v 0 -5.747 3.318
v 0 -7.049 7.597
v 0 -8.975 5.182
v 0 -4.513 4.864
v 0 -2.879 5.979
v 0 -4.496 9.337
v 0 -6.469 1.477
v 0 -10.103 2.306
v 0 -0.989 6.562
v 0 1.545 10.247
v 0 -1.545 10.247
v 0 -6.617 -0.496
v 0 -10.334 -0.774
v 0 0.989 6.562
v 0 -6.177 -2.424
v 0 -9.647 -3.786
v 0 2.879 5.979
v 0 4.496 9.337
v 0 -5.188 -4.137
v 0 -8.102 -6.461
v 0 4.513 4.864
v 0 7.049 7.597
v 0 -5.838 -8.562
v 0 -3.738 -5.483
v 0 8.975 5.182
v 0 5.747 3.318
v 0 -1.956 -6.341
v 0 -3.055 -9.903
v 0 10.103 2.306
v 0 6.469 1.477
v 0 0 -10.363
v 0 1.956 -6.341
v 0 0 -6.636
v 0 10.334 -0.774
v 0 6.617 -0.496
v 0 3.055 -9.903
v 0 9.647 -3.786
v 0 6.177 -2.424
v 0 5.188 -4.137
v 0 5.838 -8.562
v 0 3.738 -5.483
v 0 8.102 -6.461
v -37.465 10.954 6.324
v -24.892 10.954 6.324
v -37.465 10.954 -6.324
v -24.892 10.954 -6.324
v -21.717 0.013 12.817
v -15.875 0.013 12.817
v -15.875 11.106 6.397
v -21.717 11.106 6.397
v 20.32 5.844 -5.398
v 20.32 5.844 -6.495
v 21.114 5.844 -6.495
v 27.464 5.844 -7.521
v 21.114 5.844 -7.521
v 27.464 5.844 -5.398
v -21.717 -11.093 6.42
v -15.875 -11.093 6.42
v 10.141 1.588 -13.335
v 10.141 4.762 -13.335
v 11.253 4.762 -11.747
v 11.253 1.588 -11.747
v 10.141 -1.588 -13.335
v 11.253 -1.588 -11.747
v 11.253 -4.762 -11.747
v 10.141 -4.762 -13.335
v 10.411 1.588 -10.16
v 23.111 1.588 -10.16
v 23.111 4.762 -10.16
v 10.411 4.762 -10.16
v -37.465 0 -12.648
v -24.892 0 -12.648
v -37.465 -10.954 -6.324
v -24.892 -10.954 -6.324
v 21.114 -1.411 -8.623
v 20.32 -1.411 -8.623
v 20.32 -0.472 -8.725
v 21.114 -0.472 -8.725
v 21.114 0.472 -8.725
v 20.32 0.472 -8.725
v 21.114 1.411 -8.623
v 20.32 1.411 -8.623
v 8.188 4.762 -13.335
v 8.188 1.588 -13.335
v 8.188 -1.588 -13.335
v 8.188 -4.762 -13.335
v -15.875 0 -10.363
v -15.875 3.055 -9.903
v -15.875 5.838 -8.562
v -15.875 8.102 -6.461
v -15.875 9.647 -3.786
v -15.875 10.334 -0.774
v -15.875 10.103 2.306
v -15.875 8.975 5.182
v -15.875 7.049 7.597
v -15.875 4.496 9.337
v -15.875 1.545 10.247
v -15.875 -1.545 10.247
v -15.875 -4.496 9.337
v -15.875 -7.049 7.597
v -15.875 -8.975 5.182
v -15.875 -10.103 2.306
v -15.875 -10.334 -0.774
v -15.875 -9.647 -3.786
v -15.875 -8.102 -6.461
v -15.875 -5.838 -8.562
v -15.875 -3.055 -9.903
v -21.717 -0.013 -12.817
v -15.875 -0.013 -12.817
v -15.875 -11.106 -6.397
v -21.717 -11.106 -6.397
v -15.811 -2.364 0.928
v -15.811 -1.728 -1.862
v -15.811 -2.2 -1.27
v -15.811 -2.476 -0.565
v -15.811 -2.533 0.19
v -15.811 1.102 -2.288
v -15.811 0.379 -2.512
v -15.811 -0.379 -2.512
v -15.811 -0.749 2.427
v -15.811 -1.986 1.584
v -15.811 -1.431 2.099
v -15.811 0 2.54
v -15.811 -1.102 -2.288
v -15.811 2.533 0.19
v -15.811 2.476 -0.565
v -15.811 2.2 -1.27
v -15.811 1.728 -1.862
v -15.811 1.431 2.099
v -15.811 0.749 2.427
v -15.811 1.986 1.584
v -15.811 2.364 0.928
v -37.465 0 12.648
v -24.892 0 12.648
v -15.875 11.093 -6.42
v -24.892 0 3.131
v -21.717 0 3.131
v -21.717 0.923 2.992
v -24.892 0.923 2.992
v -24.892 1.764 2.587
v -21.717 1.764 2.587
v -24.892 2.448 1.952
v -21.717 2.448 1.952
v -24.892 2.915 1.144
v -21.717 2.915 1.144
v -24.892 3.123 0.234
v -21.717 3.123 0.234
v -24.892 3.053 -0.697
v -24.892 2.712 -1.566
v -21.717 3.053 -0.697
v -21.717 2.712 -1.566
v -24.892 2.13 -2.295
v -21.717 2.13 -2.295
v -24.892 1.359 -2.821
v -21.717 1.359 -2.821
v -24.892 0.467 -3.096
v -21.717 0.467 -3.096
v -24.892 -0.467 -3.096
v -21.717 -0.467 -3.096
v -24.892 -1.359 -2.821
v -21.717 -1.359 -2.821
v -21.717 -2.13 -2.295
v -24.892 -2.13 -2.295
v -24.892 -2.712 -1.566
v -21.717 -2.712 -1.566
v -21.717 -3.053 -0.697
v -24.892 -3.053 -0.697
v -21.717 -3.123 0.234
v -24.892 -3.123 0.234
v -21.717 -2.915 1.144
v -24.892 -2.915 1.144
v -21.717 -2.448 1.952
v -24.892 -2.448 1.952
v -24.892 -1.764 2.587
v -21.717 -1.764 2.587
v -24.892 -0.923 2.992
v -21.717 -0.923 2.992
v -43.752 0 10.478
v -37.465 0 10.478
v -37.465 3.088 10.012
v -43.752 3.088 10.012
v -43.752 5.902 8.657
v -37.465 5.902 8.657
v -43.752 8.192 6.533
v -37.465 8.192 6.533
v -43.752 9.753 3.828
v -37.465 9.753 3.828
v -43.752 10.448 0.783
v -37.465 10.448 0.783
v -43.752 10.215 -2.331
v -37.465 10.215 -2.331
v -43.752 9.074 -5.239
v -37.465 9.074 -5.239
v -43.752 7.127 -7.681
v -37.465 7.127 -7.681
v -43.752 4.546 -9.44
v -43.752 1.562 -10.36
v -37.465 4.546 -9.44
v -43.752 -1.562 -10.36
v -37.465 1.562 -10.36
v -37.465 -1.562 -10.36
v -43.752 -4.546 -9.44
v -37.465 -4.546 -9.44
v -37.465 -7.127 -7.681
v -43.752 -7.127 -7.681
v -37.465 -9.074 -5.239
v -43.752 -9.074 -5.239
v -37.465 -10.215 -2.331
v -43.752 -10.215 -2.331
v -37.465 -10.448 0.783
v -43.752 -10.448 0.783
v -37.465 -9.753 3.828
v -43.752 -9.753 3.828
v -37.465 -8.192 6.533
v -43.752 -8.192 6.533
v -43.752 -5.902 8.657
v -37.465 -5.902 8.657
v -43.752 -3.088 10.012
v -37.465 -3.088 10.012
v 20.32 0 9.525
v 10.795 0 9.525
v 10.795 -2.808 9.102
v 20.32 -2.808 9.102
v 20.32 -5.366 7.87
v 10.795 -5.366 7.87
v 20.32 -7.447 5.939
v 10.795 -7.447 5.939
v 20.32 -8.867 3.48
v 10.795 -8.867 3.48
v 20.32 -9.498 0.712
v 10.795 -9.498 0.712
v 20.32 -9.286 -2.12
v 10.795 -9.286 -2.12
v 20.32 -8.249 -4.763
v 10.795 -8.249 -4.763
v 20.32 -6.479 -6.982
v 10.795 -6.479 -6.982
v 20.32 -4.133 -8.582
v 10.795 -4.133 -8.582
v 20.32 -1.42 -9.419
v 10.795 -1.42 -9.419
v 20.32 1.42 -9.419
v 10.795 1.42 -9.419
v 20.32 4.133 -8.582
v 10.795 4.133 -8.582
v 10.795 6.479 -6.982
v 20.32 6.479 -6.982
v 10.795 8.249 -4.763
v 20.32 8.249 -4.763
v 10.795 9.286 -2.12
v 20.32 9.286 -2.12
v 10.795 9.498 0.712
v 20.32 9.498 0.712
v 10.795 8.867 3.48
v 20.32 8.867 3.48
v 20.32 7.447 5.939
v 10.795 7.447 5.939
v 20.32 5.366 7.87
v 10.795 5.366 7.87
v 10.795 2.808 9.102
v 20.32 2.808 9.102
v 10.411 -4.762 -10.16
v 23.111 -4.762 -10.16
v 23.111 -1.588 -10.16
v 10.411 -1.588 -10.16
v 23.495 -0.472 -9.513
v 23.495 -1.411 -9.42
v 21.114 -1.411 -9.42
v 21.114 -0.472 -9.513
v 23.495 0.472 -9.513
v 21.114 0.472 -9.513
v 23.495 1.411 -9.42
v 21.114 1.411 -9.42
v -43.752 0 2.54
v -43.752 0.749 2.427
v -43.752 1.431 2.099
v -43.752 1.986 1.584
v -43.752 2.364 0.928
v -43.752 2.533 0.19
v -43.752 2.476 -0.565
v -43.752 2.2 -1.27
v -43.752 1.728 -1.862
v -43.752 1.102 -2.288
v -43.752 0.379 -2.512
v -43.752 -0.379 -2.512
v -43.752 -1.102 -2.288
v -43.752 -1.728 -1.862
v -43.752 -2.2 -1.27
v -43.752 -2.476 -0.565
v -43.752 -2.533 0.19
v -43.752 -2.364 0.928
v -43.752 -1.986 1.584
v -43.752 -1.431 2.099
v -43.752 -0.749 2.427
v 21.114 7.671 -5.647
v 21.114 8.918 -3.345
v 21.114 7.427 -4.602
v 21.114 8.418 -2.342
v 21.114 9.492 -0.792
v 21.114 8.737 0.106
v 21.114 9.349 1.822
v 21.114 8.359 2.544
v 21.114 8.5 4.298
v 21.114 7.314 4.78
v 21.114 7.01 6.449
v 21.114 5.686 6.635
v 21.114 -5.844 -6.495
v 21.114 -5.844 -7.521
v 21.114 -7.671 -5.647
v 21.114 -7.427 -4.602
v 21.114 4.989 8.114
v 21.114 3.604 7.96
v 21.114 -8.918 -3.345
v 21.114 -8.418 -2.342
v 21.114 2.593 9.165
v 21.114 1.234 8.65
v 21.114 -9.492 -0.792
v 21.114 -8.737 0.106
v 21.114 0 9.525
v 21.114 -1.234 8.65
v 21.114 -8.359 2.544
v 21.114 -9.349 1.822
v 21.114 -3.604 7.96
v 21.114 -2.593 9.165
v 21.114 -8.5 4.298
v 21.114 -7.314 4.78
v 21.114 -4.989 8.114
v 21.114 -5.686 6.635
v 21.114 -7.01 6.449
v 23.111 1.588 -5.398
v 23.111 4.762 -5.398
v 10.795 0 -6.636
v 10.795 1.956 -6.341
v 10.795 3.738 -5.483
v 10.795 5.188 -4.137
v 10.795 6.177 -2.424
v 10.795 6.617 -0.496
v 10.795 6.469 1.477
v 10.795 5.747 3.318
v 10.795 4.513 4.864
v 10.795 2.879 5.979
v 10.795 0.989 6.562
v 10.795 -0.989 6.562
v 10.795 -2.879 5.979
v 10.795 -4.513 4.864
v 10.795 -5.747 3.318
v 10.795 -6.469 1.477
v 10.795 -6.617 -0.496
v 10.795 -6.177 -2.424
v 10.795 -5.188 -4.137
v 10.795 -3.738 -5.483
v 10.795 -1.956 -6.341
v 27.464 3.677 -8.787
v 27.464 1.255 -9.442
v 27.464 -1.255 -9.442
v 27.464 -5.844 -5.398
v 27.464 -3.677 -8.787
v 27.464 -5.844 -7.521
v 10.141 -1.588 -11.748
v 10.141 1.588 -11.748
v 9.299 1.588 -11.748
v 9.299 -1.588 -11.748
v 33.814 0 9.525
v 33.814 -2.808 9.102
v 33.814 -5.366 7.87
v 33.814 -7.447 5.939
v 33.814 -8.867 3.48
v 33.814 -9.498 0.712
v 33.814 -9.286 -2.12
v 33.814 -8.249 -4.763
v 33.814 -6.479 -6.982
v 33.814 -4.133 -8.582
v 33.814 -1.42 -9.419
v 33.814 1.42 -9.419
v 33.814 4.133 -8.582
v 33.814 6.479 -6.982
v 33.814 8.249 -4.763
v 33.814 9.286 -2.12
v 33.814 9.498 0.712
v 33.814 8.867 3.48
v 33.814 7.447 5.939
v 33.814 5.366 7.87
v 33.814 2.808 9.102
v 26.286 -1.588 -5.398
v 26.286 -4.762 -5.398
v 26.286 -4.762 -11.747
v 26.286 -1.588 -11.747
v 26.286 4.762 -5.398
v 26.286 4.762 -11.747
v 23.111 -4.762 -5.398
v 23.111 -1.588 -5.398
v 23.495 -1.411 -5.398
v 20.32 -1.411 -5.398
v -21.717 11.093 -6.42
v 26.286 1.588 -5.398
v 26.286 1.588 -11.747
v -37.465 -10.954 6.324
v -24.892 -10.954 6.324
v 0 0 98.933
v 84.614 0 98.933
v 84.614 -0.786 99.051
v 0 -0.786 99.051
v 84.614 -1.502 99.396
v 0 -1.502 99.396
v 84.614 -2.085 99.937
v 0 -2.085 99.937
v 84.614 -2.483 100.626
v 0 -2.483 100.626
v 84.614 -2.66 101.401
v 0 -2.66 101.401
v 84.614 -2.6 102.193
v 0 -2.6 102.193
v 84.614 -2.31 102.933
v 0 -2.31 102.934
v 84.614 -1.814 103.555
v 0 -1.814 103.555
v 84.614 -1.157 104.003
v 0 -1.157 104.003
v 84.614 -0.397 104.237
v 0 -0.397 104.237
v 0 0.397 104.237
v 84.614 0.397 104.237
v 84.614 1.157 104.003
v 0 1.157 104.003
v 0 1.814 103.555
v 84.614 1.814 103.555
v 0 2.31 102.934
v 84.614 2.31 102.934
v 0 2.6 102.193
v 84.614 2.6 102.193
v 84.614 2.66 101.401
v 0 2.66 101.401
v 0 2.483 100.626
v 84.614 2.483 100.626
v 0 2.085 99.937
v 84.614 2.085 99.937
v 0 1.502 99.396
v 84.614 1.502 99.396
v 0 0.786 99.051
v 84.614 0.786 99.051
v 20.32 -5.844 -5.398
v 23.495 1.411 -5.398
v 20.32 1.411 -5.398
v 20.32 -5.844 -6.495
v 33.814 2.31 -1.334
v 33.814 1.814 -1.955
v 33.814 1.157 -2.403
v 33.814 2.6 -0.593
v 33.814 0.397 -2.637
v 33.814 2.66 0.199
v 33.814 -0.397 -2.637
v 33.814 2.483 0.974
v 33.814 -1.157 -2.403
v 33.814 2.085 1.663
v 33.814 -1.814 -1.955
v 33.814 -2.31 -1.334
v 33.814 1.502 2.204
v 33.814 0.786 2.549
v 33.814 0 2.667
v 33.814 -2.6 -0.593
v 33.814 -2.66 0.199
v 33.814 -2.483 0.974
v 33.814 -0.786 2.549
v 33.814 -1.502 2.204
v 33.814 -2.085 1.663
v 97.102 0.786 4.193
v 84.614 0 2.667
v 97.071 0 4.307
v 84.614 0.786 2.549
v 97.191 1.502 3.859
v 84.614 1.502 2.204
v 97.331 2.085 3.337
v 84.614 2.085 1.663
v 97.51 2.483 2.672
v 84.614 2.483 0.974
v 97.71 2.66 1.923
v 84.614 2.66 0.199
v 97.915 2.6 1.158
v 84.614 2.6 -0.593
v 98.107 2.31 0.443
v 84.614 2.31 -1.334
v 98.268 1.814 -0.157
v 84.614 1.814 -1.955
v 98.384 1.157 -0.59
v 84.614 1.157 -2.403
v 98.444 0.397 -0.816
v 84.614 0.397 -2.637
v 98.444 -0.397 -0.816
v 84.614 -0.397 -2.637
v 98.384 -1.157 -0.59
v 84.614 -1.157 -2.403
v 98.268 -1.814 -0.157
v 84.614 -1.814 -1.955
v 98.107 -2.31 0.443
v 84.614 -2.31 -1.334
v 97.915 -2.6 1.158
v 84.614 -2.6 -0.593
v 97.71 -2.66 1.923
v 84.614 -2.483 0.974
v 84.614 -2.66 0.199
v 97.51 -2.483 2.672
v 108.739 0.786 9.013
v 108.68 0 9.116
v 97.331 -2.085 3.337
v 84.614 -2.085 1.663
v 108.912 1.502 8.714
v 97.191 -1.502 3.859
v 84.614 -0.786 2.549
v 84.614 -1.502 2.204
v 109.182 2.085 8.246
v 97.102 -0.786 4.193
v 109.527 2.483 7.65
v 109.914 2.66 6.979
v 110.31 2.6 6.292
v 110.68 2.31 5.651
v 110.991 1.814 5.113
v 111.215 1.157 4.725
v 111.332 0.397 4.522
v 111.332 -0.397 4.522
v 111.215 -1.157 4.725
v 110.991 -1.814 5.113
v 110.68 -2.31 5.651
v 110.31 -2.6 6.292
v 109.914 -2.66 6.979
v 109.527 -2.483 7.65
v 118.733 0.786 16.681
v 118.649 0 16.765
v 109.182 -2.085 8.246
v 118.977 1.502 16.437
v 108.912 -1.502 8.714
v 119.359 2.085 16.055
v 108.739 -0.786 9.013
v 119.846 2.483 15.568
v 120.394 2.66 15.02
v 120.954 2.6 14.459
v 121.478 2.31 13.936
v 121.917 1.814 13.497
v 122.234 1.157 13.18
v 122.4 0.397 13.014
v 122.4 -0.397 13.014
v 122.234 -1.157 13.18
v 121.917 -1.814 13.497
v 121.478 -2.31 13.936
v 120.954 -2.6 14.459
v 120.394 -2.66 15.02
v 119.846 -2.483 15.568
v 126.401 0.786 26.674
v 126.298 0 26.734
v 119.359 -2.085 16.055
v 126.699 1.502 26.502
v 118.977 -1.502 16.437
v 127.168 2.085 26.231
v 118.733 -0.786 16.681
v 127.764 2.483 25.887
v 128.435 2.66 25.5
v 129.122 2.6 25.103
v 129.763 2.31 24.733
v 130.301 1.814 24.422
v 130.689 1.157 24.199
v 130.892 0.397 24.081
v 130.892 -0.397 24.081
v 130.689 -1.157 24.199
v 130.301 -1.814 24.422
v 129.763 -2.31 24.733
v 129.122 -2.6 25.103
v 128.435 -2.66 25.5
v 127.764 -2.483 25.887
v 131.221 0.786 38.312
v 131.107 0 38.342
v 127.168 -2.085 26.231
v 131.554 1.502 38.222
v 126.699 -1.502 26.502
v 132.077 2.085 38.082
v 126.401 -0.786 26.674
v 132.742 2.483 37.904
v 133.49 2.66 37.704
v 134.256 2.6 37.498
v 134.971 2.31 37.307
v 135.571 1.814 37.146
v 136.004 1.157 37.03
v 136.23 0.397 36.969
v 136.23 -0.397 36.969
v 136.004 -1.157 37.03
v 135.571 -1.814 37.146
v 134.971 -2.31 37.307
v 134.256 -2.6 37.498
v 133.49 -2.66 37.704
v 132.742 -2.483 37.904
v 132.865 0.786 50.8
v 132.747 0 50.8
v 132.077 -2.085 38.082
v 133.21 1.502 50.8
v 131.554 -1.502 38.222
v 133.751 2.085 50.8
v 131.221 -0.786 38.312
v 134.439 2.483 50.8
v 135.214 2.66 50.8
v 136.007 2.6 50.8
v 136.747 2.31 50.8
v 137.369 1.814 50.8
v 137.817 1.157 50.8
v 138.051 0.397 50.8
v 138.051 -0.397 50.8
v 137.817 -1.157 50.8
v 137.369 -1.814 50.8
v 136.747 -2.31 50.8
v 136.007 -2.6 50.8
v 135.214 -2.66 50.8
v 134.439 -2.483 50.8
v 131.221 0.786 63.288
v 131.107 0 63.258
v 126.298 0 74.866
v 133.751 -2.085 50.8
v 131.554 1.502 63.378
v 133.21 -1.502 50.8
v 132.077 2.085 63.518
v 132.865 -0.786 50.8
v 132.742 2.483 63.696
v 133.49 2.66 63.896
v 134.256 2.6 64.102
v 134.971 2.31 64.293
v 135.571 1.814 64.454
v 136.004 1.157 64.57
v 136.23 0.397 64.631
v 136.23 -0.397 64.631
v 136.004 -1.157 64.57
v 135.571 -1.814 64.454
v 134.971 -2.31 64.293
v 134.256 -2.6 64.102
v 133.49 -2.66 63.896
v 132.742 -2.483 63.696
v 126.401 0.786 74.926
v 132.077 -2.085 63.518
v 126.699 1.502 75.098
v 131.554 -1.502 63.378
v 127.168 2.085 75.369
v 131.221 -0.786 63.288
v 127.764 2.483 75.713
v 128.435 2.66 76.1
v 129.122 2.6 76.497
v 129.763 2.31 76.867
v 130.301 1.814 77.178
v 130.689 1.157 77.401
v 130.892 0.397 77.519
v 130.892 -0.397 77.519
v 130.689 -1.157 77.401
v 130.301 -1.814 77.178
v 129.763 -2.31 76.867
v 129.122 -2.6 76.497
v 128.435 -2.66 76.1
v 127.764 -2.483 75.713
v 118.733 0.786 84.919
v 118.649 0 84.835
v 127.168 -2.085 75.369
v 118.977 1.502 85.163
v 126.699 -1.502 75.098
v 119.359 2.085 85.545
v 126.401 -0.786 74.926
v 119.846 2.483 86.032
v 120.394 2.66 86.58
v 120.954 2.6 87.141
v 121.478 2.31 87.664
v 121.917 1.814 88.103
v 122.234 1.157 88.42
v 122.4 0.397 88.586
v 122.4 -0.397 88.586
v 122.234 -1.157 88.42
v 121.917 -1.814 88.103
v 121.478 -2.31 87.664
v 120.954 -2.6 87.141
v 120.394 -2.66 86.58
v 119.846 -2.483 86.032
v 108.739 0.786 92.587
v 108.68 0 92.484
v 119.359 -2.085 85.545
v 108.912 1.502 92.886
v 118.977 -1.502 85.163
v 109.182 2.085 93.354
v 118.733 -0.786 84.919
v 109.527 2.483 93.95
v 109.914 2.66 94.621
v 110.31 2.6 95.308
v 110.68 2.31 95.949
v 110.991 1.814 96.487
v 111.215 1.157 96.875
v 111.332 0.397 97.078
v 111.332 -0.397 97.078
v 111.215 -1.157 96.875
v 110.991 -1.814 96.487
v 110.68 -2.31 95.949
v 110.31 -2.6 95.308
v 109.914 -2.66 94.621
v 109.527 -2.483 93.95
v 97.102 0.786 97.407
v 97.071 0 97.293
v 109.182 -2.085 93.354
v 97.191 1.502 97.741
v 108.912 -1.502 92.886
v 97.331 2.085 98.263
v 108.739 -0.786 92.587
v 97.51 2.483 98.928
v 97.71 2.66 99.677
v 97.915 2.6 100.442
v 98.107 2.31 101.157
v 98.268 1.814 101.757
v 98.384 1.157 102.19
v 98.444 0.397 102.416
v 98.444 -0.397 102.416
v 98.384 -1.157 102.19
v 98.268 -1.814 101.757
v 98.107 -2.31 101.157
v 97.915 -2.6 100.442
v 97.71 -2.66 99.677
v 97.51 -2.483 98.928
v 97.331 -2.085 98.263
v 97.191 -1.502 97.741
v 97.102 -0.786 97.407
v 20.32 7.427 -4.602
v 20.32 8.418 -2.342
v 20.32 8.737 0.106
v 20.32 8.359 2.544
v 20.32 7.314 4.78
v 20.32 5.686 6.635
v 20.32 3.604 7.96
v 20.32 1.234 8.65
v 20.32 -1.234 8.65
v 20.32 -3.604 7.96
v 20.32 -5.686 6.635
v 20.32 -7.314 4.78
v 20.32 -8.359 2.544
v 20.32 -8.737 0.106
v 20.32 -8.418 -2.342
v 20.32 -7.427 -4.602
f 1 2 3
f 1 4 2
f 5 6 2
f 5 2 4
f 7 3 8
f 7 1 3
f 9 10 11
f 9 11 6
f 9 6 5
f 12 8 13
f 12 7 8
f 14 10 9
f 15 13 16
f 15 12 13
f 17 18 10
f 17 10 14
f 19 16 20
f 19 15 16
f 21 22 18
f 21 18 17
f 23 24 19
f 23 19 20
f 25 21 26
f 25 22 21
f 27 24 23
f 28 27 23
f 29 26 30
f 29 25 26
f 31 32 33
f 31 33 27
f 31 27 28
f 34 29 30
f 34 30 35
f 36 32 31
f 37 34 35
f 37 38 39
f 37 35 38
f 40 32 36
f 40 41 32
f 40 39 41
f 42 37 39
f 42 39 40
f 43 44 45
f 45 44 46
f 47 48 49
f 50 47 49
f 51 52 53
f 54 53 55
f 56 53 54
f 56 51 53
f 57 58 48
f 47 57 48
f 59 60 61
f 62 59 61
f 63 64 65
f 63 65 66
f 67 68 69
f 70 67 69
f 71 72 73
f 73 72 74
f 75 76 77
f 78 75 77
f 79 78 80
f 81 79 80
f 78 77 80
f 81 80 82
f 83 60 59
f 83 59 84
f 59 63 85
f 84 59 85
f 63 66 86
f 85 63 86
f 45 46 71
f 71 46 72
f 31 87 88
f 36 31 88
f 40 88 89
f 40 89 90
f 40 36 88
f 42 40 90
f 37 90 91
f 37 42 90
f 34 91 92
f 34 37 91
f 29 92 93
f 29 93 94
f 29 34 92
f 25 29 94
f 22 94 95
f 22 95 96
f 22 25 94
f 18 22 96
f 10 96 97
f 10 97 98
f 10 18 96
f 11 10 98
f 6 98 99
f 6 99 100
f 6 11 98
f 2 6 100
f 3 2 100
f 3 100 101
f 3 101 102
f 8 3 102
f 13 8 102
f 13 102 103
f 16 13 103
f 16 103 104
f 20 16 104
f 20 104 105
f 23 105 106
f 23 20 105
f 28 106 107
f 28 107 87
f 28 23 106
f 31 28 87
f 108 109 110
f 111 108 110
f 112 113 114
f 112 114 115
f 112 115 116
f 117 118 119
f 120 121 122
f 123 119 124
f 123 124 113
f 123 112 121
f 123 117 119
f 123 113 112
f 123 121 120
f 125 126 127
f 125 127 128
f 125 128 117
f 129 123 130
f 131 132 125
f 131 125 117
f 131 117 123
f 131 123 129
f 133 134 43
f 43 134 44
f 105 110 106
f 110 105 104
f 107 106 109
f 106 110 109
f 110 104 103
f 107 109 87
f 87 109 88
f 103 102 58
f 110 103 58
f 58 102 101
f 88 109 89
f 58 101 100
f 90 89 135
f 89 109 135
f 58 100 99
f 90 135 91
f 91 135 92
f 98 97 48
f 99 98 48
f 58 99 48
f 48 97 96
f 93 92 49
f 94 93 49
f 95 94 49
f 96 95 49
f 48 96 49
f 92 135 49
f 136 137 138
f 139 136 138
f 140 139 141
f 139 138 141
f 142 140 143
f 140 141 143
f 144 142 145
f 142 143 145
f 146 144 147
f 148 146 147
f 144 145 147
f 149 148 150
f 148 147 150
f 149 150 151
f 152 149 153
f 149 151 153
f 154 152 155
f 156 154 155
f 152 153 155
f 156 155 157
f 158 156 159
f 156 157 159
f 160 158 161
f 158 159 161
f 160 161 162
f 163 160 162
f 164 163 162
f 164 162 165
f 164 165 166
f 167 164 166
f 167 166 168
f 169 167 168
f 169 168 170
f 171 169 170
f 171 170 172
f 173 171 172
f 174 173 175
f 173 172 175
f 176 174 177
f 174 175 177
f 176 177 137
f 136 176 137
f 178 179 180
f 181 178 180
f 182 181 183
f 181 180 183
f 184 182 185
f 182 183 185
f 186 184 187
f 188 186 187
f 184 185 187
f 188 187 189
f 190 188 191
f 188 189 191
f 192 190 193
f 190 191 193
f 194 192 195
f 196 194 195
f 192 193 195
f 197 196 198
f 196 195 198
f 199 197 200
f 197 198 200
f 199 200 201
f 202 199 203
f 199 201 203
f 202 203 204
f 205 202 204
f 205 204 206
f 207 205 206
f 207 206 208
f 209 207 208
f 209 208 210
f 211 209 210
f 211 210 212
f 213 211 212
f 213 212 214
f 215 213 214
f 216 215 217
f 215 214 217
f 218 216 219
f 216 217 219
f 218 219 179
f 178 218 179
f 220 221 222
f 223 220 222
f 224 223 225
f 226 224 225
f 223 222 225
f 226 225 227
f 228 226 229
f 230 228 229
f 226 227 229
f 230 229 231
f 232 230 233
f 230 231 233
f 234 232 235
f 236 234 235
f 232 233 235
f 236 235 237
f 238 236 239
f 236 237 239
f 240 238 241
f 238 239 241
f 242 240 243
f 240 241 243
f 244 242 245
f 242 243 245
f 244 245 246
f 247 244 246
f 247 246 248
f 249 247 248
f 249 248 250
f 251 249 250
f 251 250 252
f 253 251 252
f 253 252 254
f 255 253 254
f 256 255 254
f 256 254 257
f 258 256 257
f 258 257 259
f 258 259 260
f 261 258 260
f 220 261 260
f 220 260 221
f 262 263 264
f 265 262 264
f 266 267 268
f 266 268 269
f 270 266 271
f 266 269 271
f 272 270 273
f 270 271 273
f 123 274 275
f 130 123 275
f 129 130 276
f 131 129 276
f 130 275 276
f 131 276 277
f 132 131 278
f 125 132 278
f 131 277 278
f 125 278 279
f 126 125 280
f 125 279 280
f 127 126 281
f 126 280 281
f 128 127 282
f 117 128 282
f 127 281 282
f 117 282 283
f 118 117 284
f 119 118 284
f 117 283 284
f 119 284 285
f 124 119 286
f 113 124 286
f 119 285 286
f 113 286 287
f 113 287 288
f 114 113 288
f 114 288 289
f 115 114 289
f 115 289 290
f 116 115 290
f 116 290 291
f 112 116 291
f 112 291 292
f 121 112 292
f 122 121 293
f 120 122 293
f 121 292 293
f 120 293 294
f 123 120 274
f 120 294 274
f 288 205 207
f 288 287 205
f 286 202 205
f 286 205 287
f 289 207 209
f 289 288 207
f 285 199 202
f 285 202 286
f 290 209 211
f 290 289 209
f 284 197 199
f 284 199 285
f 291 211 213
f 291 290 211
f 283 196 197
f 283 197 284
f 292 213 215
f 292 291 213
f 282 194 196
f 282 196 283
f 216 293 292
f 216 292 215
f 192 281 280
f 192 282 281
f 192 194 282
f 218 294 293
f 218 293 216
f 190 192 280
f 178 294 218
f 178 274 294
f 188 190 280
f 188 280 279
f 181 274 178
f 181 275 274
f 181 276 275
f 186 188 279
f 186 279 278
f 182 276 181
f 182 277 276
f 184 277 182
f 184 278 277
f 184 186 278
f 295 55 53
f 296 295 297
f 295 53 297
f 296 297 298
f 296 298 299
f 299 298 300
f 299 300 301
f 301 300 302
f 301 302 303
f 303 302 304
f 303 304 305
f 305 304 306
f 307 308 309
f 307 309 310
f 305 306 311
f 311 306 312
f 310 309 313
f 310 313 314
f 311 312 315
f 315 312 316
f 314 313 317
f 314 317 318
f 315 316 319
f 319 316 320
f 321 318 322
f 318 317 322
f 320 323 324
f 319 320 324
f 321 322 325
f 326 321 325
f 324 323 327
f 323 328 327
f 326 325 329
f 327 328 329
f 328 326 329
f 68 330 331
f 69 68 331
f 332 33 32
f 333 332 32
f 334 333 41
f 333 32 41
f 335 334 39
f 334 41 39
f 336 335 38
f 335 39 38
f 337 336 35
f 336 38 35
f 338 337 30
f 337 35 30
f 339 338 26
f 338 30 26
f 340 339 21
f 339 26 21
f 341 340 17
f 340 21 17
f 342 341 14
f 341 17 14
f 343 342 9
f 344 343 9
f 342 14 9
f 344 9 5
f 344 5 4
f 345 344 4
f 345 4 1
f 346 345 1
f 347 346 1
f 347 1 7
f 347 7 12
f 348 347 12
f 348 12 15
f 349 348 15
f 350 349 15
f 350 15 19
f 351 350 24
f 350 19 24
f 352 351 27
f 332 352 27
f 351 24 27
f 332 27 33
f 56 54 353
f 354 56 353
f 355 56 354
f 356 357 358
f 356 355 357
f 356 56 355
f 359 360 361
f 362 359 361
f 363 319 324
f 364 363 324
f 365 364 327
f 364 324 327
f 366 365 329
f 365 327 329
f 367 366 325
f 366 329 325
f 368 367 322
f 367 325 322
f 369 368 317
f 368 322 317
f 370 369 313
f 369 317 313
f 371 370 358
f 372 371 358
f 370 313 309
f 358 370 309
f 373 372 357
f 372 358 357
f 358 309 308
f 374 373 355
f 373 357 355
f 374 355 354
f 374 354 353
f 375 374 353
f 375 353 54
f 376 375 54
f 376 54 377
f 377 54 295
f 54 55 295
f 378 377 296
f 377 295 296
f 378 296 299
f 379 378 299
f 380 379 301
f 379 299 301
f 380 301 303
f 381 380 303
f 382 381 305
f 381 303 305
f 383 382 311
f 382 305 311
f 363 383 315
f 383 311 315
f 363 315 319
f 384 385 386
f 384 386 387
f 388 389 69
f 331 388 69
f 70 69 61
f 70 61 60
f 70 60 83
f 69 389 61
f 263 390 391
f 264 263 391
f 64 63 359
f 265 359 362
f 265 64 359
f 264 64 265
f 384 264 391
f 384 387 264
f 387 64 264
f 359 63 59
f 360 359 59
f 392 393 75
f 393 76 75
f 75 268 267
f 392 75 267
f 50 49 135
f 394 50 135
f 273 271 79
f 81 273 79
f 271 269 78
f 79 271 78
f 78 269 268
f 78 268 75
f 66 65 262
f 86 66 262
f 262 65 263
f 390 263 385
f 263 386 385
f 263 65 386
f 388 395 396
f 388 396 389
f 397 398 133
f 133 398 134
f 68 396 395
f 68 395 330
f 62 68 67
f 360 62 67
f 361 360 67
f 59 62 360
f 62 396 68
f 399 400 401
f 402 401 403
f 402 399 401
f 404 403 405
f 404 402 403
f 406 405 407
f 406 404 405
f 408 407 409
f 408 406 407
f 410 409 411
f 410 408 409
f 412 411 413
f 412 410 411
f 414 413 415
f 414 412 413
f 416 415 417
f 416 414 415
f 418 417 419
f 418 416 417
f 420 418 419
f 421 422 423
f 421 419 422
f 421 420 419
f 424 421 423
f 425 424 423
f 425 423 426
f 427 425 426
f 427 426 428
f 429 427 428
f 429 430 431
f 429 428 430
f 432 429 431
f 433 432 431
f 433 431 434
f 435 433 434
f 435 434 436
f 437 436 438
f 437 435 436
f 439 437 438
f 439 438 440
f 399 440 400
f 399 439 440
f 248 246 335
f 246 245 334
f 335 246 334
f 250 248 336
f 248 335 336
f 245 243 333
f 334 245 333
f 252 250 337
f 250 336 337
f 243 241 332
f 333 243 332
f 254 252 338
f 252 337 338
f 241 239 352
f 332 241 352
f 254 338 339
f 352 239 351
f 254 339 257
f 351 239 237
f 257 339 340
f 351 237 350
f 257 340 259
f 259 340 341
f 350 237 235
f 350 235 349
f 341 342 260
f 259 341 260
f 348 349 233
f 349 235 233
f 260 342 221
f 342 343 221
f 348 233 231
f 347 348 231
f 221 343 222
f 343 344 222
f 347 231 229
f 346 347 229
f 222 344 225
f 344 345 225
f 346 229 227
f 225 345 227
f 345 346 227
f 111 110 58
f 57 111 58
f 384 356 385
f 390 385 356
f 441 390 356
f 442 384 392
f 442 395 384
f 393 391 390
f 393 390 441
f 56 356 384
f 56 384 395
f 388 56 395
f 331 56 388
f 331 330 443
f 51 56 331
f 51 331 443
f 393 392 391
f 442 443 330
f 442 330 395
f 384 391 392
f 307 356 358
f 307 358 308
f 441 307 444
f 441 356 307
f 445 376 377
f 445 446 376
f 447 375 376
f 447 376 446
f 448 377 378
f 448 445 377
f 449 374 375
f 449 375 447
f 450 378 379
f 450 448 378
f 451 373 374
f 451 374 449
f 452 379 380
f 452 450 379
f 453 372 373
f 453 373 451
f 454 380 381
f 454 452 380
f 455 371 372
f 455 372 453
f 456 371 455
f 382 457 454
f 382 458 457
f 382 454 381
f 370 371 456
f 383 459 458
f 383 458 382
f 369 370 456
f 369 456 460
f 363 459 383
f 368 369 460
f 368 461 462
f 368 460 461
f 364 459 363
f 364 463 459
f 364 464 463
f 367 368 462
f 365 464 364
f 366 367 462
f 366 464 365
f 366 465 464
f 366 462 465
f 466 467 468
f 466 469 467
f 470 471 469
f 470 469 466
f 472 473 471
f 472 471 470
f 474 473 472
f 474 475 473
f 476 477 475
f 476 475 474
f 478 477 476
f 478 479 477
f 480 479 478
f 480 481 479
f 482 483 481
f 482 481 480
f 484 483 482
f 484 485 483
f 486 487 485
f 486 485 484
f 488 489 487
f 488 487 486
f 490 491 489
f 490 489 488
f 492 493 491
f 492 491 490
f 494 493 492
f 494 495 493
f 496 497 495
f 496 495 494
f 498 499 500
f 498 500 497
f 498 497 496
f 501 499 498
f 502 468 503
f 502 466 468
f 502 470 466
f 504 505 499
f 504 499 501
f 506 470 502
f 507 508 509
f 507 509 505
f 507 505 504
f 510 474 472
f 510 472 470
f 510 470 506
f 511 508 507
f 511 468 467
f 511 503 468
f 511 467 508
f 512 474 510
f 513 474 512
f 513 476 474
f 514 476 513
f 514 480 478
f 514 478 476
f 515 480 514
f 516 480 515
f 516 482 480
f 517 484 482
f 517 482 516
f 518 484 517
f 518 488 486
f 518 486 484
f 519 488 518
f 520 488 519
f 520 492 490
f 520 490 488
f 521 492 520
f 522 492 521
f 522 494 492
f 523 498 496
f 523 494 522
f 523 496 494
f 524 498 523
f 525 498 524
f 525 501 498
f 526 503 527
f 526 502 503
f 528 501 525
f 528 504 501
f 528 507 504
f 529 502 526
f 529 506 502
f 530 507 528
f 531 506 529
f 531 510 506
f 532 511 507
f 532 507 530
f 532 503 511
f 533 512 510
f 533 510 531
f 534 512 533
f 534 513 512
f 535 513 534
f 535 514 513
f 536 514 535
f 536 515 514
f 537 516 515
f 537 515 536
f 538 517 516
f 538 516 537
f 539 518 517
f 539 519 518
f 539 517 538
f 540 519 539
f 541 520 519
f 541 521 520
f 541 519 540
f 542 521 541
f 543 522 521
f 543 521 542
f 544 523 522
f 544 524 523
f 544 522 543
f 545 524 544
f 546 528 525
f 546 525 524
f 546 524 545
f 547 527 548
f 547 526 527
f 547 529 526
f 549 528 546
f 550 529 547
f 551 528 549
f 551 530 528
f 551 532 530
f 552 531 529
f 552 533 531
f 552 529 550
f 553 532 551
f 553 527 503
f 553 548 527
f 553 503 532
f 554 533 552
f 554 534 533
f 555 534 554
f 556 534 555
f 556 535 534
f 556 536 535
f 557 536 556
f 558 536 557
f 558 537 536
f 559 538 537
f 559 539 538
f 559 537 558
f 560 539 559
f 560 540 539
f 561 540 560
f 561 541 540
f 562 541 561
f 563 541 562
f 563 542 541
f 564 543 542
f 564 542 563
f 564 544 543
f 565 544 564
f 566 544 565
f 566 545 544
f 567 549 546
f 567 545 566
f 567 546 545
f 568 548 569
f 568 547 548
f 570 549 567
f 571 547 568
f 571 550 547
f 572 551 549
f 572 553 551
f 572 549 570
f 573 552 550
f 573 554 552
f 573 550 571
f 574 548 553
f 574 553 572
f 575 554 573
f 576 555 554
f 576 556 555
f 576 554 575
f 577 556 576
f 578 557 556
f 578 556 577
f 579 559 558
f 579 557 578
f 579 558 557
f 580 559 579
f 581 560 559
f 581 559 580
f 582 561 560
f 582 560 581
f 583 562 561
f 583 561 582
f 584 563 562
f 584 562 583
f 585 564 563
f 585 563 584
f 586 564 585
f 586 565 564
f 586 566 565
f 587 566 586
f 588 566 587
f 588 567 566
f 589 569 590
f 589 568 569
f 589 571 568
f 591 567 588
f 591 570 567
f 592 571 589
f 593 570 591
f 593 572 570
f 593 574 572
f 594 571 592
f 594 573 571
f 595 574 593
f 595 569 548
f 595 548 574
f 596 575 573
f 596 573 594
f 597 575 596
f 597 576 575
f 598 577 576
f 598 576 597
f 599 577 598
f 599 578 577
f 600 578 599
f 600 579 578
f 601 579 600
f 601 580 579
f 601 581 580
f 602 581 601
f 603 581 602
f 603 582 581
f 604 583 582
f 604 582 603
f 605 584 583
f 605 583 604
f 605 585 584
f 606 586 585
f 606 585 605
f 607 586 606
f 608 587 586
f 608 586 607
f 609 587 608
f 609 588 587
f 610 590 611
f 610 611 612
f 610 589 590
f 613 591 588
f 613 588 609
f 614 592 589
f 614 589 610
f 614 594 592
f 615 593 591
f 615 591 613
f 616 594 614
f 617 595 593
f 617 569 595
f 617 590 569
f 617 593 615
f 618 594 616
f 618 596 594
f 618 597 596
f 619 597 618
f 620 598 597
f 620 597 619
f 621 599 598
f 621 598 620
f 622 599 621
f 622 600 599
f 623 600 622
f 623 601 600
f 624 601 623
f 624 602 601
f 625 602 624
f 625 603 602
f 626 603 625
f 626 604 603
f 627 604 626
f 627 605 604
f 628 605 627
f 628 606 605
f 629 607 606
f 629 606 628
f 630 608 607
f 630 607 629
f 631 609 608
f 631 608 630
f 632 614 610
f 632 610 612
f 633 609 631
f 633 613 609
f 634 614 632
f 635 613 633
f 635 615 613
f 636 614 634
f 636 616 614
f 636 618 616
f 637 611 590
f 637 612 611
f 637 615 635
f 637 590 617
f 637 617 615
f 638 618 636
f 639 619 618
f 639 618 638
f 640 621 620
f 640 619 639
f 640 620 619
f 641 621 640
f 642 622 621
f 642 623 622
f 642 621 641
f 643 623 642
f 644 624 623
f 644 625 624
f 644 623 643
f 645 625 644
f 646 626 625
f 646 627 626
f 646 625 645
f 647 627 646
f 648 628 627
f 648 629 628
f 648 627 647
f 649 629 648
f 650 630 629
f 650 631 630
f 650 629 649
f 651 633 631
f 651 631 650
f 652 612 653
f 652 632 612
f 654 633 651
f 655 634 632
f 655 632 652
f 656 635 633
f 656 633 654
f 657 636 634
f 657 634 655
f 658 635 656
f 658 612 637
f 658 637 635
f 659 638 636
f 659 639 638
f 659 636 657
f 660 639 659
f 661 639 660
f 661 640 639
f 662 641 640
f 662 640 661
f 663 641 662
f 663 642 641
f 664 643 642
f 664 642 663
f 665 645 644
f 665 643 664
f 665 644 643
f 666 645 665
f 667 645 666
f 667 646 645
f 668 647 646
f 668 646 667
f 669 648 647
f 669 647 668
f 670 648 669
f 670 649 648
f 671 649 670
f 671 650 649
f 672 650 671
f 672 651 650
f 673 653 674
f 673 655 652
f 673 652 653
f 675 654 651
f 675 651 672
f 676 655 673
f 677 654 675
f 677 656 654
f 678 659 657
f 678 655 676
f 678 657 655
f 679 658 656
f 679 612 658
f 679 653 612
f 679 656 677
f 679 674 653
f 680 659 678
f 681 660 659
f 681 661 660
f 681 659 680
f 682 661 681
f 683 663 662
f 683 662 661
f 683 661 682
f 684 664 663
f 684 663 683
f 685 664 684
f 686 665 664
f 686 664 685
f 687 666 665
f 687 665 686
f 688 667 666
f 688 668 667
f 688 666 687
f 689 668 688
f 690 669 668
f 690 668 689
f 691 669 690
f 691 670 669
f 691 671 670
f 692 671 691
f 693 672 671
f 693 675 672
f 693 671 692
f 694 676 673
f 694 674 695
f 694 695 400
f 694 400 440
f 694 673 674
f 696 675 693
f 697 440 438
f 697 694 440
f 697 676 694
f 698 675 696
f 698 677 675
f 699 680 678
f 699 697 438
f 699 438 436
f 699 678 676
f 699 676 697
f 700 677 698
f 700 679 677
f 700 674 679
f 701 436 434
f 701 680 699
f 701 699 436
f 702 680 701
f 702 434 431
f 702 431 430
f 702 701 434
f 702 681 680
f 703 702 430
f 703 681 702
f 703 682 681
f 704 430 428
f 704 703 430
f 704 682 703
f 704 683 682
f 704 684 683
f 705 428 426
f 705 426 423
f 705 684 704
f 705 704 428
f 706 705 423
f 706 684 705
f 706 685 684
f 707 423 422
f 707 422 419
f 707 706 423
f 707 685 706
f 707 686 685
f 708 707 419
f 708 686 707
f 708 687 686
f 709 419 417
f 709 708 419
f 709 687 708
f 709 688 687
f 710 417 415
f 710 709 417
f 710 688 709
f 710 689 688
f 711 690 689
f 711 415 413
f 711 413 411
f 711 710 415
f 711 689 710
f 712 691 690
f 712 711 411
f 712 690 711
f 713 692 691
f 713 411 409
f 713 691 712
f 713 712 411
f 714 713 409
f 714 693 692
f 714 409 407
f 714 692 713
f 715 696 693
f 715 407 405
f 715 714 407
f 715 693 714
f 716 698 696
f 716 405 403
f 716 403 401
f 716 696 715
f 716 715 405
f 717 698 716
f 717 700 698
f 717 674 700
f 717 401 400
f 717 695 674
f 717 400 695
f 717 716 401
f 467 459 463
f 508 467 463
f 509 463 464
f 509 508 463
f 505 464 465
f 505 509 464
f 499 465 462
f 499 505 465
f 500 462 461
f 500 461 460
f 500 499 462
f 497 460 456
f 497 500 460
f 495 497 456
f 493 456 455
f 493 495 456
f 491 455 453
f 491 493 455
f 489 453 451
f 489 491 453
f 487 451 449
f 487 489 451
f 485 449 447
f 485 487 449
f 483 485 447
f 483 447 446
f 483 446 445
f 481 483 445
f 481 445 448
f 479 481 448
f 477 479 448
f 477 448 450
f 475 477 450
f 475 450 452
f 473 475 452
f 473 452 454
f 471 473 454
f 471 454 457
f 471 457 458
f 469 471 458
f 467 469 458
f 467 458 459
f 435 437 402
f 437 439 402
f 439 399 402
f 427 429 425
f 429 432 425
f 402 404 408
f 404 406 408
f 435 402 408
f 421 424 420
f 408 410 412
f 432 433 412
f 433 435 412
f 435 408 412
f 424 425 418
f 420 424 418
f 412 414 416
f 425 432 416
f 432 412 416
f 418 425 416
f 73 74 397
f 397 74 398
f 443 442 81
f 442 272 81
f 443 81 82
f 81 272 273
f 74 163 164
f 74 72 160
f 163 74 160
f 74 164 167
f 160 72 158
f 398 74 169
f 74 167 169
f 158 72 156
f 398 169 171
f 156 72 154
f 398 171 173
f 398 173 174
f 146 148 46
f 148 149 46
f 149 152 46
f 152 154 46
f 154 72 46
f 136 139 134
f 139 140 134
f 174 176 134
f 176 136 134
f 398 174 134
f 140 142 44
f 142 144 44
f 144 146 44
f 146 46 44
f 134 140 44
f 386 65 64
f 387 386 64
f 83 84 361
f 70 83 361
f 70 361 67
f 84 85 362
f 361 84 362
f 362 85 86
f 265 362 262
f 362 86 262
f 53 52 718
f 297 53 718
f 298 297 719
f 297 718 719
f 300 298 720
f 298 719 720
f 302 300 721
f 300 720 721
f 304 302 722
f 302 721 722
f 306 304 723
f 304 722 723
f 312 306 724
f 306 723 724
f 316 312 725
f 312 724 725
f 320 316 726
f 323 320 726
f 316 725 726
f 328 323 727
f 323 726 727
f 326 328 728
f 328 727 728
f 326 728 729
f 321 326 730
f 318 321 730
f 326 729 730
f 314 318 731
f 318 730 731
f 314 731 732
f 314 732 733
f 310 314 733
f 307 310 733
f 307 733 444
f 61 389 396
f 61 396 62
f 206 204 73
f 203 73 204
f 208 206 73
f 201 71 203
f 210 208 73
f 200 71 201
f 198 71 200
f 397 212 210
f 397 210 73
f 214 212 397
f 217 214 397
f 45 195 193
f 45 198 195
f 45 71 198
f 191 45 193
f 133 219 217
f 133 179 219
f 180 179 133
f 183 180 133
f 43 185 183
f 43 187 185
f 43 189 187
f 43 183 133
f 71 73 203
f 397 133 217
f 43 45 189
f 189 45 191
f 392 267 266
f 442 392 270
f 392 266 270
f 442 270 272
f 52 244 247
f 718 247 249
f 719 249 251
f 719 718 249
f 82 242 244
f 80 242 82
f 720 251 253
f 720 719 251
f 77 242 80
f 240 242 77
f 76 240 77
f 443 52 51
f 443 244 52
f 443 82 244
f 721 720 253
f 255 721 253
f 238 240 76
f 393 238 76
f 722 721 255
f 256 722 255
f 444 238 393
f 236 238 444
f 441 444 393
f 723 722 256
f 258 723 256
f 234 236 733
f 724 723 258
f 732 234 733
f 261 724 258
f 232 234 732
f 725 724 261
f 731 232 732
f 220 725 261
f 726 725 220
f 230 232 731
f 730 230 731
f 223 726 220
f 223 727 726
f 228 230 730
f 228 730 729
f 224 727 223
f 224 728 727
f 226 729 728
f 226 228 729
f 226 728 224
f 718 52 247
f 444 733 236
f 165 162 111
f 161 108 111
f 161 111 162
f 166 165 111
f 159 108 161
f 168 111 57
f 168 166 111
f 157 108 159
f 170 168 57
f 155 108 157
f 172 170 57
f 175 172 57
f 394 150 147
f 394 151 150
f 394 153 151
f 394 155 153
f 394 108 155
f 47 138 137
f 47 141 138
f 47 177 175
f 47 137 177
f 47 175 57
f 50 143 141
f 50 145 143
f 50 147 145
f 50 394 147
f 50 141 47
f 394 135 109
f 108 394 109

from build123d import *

# Parameters (mm, degrees)
SKETCH1_R               = 10.3632
BOSS_EXTRUDE1_DEPTH     = 15.875
BOSS_EXTRUDE2_DEPTH     = 5.842
SKETCH3_R               = 3.131421561
BOSS_EXTRUDE3_DEPTH     = 3.175
BOSS_EXTRUDE4_DEPTH     = 12.573
SKETCH5_R               = 10.4775
BOSS_EXTRUDE5_DEPTH     = 6.2865
SKETCH6_R               = 6.63575
BOSS_EXTRUDE6_DEPTH     = 10.795
SKETCH7_R               = 9.525
BOSS_EXTRUDE7_DEPTH     = 9.525
SKETCH9_R               = 8.7376
BOSS_EXTRUDE8_DEPTH     = 0.79375
SKETCH10_R              = 9.525
BOSS_EXTRUDE9_DEPTH     = 12.7
CUT_EXTRUDE1_DEPTH      = 1.5875
CUT_EXTRUDE2_REACH      = 51.292
CUT_EXTRUDE2_END_RADIUS = 9.525
SKETCH12_W              = 3.175
SKETCH12_H              = 3.175
BOSS_EXTRUDE10_DEPTH    = 6.35
SKETCH13_W              = 1.5875
SKETCH13_H              = 3.175
BOSS_EXTRUDE11_DEPTH    = 12.7
BOSS_EXTRUDE12_DEPTH    = 3.175
BOSS_EXTRUDE13_DEPTH    = 3.175
SKETCH17_W              = 1.953483497
SKETCH17_H              = 9.525
BOSS_EXTRUDE14_DEPTH    = 1.5875
CUT_EXTRUDE3_REACH      = 50.413
SKETCH21_R              = 2.667
SKETCH22_R              = 2.54
CUT_EXTRUDE4_DEPTH      = 27.94


with BuildPart() as part:
    # Sketch1 → Boss-Extrude1 (new body)
    with BuildSketch(Plane(origin=(0, 0, 0), x_dir=(0, 0, -1), z_dir=(1, 0, 0))):
        Circle(SKETCH1_R)
    extrude(amount=-BOSS_EXTRUDE1_DEPTH)

    # Sketch2 → Boss-Extrude2 (add)
    with BuildSketch(Plane.ZY.offset(15.875)):
        Polygon((6.397302804, 11.106241349), (-6.419635747, 11.093347418), (-12.81693855, -0.012893931), (-6.397302804, -11.106241349), (6.419635747, -11.093347418), (12.81693855, 0.012893931), align=None)
    extrude(amount=BOSS_EXTRUDE2_DEPTH)

    # Sketch3 → Boss-Extrude3 (add)
    with BuildSketch(Plane.ZY.offset(21.717)):
        Circle(SKETCH3_R)
    extrude(amount=BOSS_EXTRUDE3_DEPTH)

    # Sketch4 → Boss-Extrude4 (add)
    with BuildSketch(Plane.ZY.offset(24.892)):
        Polygon((-12.648301022, 0), (-6.324150511, -10.95375), (6.324150511, -10.95375), (12.648301022, 0), (6.324150511, 10.95375), (-6.324150511, 10.95375), align=None)
    extrude(amount=BOSS_EXTRUDE4_DEPTH)

    # Sketch5 → Boss-Extrude5 (add)
    with BuildSketch(Plane.ZY.offset(37.465)):
        Circle(SKETCH5_R)
    extrude(amount=BOSS_EXTRUDE5_DEPTH)

    # Sketch6 → Boss-Extrude6 (add)
    with BuildSketch(Plane(origin=(0, 0, 0), x_dir=(0, 0, -1), z_dir=(1, 0, 0))):
        Circle(SKETCH6_R)
    extrude(amount=BOSS_EXTRUDE6_DEPTH)

    # Sketch7 → Boss-Extrude7 (add)
    with BuildSketch(Plane(origin=(10.795, 0, 0), x_dir=(0, 0, -1), z_dir=(1, 0, 0))):
        with Locations(Location((0, 0, 0), (0, 0, 180))):
            Circle(SKETCH7_R)
    extrude(amount=BOSS_EXTRUDE7_DEPTH)

    # Sketch9 → Boss-Extrude8 (add)
    with BuildSketch(Plane(origin=(20.32, 0, 0), x_dir=(0, 0, -1), z_dir=(1, 0, 0))):
        Circle(SKETCH9_R)
    extrude(amount=BOSS_EXTRUDE8_DEPTH)

    # Sketch10 → Boss-Extrude9 (add)
    with BuildSketch(Plane(origin=(21.11375, 0, 0), x_dir=(0, 0, -1), z_dir=(1, 0, 0))):
        with Locations(Location((0, 0, 0), (0, 0, 180))):
            Circle(SKETCH10_R)
    extrude(amount=BOSS_EXTRUDE9_DEPTH)

    # Sketch11 → Cut-Extrude1 (cut)
    with BuildSketch(Plane.XY.offset(-6.985)):
        Polygon((27.46375, 5.844282471), (27.46375, -5.844282471), (20.32, -5.844282471), (20.32, -1.410545514), (23.495, -1.410545514), (23.495, 1.410545514), (20.32, 1.410545514), (20.32, 5.844282471), align=None)
    extrude(amount=CUT_EXTRUDE1_DEPTH, mode=Mode.SUBTRACT)

    # Cut-Extrude2: up to this cylinder (the profile starts inside it)
    cut_extrude2_end = Plane(origin=(24.130314, 0, 0), z_dir=(-1, 0, 0)) * Cylinder(CUT_EXTRUDE2_END_RADIUS, 122.634, mode=Mode.PRIVATE)
    # Sketch11<2> → Cut-Extrude2 (cut, up to the surface)
    with BuildSketch(Plane.XY.offset(-6.985), mode=Mode.PRIVATE) as cut_extrude2_sk1:
        Polygon((27.46375, 5.844282471), (27.46375, -5.844282471), (20.32, -5.844282471), (20.32, -1.410545514), (23.495, -1.410545514), (23.495, 1.410545514), (20.32, 1.410545514), (20.32, 5.844282471), align=None)
    cut_extrude2_tool1 = extrude(cut_extrude2_sk1.sketch, amount=-CUT_EXTRUDE2_REACH, mode=Mode.PRIVATE) & cut_extrude2_end
    add(cut_extrude2_tool1.solids().sort_by_distance((24.130314, 0, -6.985))[0], mode=Mode.SUBTRACT)

    # Sketch12 → Boss-Extrude10 (add)
    with BuildSketch(Plane(origin=(0, 0, -5.3975), x_dir=(-1, 0, 0), z_dir=(0, 0, -1))):
        with Locations((-24.69818991, -3.175)):
            Rectangle(SKETCH12_W, SKETCH12_H)
        with Locations((-24.69818991, 3.175)):
            Rectangle(SKETCH12_W, SKETCH12_H)
    extrude(amount=BOSS_EXTRUDE10_DEPTH)

    # Sketch13 → Boss-Extrude11 (add)
    with BuildSketch(Plane.ZY.offset(-23.11068991)):
        with Locations((-10.95375, -3.175)):
            Rectangle(SKETCH13_W, SKETCH13_H)
        with Locations((-10.95375, 3.175)):
            Rectangle(SKETCH13_W, SKETCH13_H)
    extrude(amount=BOSS_EXTRUDE11_DEPTH)

    # Sketch14 → Boss-Extrude12 (add)
    with BuildSketch(Plane.XZ.offset(4.7625)):
        Polygon((12.364173407, -10.16), (10.141014473, -13.335), (8.187530976, -13.335), (10.41068991, -10.16), align=None)
    extrude(amount=-BOSS_EXTRUDE12_DEPTH)

    # Sketch16 → Boss-Extrude13 (add)
    with BuildSketch(Plane(origin=(0, 4.7625, 0), x_dir=(1, 0, 0), z_dir=(0, 1, 0))):
        Polygon((10.41068991, 10.16), (8.187530976, 13.335), (10.141014473, 13.335), (12.364173407, 10.16), align=None)
    extrude(amount=-BOSS_EXTRUDE13_DEPTH)

    # Sketch17 → Boss-Extrude14 (add)
    with BuildSketch(Plane(origin=(0, 0, -13.335), x_dir=(-1, 0, 0), z_dir=(0, 0, -1))):
        with Locations((-9.164272724, 0)):
            Rectangle(SKETCH17_W, SKETCH17_H)
    extrude(amount=-BOSS_EXTRUDE14_DEPTH)

    # Sketch18 → Cut-Extrude3 (cut, up to next)
    with BuildSketch(Plane(origin=(0, 4.7625, 0), x_dir=(1, 0, 0), z_dir=(0, 1, 0)), mode=Mode.PRIVATE) as cut_extrude3_sk1:
        Polygon((10.41068991, 10.16), (8.187530976, 13.335), (8.187530976, 10.16), align=None)
    cut_extrude3_tool1 = extrude(cut_extrude3_sk1.sketch, amount=-CUT_EXTRUDE3_REACH, mode=Mode.PRIVATE) & part.part
    add(cut_extrude3_tool1.solids().sort_by_distance((8.928584, 4.7625, -11.218333))[0], mode=Mode.SUBTRACT)

    # Sweep1: sweep along a path in Sketch19
    with BuildLine(Plane(origin=(0, 0, 0), x_dir=(1, 0, 0), z_dir=(0, 1, 0))) as sweep1_path:
        Line((33.81375, 0), (84.61375, 0))
        ThreePointArc((84.61375, 0), (135.41375, -50.8), (84.61375, -101.6))
        Line((84.61375, -101.6), (0, -101.6))
    # Sketch21 → Sweep1 (sweep)
    with BuildSketch(Plane(origin=(0, 0, 0), x_dir=(0, 0, -1), z_dir=(1, 0, 0))):
        with Locations((-101.6, 0)):
            Circle(SKETCH21_R)
    sweep(path=sweep1_path.line)

    # Sketch22 → Cut-Extrude4 (cut)
    with BuildSketch(Plane.ZY.offset(43.7515)):
        Circle(SKETCH22_R)
    extrude(amount=-CUT_EXTRUDE4_DEPTH, mode=Mode.SUBTRACT)


solid = part.part
